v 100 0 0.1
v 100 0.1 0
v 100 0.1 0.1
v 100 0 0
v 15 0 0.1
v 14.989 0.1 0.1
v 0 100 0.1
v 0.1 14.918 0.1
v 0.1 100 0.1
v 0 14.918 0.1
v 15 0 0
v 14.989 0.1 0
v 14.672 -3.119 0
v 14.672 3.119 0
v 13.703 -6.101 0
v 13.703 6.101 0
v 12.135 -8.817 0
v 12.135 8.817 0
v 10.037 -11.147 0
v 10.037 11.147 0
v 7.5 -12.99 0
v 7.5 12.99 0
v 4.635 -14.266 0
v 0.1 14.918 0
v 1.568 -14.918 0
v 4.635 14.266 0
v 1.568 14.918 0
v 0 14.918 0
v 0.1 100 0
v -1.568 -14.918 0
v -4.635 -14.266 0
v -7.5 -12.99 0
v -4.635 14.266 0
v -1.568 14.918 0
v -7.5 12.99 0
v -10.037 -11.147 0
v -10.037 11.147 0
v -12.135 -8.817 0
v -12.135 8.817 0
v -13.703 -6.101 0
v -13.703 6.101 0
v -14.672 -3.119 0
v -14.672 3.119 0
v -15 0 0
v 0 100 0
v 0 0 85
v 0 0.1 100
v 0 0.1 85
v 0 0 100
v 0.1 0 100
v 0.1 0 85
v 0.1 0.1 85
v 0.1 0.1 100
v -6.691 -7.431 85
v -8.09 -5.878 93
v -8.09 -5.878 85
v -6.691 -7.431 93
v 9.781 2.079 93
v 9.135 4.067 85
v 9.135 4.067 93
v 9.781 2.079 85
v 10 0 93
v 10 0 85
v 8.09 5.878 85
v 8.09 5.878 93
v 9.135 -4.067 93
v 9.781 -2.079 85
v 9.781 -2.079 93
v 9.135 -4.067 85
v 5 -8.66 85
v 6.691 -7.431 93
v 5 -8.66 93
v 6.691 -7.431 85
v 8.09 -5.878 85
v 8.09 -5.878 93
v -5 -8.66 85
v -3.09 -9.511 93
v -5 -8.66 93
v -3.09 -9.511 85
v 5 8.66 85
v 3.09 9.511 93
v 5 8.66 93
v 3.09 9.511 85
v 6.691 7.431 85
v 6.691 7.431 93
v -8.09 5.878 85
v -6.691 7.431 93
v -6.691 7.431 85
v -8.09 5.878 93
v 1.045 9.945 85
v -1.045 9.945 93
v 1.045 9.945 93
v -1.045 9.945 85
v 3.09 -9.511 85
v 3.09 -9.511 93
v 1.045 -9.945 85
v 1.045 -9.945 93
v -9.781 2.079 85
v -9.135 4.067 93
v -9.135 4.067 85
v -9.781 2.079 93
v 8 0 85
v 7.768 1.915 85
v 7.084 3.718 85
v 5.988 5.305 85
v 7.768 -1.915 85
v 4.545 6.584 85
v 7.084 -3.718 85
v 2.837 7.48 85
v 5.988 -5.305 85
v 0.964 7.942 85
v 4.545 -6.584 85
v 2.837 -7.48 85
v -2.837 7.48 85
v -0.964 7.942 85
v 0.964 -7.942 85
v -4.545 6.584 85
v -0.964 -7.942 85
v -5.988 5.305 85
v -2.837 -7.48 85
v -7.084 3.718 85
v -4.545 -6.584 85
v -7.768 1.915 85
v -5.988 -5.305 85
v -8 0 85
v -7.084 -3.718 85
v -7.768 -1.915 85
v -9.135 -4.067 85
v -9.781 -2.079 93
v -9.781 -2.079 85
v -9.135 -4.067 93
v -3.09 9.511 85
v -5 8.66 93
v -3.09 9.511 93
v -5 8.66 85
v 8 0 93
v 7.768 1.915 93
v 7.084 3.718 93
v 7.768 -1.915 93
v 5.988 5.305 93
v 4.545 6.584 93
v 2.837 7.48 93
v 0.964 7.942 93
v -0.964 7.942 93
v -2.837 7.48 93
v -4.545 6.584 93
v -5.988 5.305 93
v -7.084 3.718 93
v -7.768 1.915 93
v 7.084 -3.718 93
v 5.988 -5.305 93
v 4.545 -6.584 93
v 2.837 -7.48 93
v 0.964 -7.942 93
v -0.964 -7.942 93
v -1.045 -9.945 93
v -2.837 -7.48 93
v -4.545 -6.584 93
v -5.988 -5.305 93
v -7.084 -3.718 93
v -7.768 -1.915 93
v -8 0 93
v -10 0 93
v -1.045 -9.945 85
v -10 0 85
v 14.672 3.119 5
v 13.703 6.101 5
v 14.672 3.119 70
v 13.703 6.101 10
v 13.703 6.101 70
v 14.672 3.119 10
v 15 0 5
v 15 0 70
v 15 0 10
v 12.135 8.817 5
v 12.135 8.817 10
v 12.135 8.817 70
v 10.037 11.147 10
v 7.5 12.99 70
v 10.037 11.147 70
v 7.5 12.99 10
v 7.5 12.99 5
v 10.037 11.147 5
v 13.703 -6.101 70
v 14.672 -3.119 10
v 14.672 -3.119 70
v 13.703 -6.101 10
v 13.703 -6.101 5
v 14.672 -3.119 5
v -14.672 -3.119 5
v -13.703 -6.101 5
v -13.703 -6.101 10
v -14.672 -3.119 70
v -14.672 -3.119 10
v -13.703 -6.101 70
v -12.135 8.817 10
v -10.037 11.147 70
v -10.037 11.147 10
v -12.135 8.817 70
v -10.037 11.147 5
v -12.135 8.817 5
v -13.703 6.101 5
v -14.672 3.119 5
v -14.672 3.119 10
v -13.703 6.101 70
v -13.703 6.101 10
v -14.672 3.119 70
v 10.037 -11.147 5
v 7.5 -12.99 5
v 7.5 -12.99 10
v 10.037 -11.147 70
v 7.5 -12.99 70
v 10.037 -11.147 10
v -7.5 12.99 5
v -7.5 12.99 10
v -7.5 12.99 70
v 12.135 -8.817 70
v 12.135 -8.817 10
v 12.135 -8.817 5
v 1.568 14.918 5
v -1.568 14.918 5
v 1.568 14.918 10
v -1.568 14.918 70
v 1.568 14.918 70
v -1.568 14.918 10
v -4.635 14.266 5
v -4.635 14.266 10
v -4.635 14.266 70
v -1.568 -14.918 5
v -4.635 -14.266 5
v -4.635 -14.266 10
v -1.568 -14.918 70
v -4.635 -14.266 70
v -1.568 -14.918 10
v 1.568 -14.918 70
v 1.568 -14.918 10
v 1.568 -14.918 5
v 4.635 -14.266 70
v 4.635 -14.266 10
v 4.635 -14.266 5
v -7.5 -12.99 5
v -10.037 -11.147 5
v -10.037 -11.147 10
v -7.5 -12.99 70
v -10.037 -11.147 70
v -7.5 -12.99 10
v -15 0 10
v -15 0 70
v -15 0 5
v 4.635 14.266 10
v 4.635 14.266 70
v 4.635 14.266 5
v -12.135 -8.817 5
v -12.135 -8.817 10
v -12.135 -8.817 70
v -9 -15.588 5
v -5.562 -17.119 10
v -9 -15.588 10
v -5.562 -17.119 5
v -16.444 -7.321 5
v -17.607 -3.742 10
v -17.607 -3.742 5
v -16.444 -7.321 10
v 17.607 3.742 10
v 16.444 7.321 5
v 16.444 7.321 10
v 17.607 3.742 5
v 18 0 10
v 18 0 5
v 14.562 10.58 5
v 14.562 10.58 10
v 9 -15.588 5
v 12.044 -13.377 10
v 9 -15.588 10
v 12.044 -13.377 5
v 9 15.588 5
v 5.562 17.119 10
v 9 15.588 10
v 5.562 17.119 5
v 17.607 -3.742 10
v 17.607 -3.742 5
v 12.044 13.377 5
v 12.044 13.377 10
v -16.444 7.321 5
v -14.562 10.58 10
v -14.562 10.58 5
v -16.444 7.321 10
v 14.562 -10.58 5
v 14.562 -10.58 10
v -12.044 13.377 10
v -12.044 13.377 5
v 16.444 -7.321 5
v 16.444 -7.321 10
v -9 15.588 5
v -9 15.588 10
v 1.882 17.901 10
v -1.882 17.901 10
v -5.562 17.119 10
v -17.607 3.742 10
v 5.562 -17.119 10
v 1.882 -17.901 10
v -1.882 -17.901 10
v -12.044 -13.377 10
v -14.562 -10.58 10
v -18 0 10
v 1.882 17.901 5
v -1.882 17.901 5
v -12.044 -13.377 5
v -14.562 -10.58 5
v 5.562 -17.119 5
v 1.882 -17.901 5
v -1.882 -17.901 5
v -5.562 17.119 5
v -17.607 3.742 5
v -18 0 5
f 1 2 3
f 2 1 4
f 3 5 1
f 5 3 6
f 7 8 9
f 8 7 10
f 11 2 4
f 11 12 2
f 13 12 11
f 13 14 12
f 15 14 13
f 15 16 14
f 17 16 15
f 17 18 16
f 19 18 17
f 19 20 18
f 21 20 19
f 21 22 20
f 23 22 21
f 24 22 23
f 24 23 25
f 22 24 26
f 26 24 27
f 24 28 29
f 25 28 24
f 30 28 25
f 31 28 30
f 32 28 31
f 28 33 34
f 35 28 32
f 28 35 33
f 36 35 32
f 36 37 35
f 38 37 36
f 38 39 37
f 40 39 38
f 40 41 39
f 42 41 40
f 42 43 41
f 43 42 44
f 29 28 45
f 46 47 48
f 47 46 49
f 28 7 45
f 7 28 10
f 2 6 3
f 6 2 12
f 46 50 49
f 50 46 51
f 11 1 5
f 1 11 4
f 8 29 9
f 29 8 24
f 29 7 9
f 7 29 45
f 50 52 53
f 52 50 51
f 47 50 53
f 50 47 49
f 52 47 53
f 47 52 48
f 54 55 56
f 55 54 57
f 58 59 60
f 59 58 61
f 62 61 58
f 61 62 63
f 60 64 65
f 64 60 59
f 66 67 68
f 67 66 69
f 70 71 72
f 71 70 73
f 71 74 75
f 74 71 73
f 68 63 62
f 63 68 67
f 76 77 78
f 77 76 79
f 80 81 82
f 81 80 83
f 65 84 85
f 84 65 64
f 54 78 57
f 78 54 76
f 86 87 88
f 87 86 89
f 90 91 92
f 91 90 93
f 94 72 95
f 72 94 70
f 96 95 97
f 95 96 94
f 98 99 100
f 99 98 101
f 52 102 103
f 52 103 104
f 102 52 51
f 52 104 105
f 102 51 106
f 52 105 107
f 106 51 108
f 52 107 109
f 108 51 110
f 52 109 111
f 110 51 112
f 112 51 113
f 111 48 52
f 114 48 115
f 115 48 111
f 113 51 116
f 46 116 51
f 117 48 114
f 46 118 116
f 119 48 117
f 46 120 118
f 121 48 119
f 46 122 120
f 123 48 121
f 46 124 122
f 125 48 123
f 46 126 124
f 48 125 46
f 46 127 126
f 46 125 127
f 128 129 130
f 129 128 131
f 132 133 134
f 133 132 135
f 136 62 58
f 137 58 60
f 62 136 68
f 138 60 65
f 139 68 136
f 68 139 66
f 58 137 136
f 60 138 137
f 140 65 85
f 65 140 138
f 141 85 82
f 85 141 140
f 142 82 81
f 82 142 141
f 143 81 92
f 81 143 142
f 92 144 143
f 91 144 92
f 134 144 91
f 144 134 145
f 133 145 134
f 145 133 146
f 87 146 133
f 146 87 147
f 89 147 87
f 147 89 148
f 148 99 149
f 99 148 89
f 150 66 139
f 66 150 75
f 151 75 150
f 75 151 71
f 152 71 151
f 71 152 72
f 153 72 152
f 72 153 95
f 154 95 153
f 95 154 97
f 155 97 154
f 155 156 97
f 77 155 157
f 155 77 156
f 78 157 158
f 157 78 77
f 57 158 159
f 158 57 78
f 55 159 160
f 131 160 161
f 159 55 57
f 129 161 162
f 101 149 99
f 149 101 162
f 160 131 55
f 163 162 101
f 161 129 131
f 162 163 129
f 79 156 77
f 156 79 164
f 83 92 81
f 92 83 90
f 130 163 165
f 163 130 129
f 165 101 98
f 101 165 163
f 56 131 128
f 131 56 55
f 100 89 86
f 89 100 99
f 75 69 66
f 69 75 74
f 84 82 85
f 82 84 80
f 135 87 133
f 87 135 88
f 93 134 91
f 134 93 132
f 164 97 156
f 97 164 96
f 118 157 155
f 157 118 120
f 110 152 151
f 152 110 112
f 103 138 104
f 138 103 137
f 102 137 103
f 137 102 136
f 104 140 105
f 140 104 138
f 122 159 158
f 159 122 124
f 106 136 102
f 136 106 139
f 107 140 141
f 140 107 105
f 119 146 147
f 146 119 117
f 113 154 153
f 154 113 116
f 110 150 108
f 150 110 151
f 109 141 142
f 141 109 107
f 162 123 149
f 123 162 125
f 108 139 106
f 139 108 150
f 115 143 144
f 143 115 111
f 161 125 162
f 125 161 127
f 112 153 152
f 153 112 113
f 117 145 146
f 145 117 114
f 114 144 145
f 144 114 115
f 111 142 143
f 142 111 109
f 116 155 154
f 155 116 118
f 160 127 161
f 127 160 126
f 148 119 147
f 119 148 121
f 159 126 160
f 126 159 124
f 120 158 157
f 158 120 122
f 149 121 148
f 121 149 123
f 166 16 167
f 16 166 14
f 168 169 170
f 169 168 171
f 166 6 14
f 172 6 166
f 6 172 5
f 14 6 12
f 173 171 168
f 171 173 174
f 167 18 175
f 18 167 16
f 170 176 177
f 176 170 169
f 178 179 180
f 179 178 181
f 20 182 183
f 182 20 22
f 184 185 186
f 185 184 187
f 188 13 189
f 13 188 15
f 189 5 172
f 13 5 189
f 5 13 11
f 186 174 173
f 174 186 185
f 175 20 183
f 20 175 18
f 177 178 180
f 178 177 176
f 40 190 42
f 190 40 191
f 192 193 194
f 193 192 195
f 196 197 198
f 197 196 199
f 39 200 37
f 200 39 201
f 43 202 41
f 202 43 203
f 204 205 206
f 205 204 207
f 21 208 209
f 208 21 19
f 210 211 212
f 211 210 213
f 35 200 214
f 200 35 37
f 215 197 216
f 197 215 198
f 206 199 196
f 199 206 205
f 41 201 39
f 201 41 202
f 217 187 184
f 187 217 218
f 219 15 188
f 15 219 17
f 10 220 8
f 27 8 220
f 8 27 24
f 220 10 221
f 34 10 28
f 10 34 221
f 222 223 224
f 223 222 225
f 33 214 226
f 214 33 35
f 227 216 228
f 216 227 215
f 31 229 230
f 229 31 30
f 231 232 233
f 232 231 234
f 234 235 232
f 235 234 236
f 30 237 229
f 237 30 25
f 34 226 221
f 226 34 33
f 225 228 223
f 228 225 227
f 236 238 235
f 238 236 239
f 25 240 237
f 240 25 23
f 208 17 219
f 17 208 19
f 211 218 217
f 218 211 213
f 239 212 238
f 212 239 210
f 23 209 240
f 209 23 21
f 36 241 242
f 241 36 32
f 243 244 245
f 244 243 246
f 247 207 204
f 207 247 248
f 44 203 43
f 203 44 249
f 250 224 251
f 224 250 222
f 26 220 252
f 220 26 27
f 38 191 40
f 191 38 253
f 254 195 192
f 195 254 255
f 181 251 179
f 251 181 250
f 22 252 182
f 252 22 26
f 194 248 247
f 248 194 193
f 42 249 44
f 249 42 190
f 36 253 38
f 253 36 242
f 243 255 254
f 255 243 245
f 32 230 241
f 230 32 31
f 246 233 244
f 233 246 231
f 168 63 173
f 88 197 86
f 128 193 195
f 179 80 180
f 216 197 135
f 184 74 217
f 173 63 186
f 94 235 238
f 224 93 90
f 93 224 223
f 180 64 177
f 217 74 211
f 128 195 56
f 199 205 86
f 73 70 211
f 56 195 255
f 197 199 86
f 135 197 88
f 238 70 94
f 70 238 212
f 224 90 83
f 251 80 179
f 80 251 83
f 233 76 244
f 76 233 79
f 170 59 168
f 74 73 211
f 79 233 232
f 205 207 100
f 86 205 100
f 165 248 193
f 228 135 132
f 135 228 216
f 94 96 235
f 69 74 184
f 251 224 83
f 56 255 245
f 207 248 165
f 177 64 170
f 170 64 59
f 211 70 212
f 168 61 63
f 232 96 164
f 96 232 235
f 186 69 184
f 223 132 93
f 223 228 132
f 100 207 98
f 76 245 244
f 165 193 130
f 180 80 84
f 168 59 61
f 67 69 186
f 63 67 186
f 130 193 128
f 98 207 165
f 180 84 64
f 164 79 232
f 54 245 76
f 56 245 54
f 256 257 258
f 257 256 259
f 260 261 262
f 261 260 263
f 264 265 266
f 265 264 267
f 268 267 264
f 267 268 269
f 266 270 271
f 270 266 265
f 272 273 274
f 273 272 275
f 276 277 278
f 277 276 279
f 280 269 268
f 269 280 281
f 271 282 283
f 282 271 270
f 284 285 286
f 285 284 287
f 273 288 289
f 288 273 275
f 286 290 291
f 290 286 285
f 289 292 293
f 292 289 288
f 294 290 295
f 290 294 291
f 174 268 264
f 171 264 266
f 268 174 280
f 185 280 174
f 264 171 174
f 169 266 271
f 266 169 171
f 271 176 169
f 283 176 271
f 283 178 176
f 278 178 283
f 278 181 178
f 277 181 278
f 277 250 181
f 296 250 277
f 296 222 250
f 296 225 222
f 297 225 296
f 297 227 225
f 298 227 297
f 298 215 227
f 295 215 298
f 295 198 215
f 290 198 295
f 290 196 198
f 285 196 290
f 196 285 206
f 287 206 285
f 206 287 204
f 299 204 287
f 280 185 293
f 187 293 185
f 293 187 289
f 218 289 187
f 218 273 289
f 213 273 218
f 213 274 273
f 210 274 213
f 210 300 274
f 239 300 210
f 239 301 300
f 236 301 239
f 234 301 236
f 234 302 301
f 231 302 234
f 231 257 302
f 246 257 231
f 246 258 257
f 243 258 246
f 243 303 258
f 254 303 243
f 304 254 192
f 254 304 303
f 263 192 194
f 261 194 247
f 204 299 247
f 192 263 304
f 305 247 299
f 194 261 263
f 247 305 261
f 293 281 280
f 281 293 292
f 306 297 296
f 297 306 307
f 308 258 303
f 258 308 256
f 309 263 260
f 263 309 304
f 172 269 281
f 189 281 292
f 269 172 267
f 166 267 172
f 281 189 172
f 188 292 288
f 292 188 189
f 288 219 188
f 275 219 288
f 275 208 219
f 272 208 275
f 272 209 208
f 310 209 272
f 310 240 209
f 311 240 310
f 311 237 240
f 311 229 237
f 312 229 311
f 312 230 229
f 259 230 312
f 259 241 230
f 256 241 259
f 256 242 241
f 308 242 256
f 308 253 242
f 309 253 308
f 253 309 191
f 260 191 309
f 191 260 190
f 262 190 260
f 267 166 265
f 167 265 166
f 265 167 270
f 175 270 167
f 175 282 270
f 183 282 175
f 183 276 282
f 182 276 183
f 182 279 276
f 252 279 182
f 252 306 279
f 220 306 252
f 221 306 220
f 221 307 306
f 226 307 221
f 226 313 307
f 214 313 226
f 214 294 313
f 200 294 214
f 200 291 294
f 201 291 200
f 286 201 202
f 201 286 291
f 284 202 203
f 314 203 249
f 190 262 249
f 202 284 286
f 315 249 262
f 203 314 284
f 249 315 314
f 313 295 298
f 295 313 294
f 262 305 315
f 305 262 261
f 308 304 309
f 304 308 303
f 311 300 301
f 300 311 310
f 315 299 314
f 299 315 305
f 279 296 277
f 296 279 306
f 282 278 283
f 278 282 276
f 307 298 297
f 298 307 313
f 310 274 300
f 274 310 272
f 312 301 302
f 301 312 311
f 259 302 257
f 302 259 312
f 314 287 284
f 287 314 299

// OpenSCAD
    // Combined Scene

    // Permanent Model
    
    // Permanent Model (Black)
    color([0, 0, 0]) {
        // Your permanent model code here
        cube([100,0.1,0.1], center = false);
        cube([0.1,100,0.1], center = false);
        cube([0.1,0.1,100], center = false);
    }
    

    // Dynamic Model
    cylinder(h = 70, r = 15); // Main body of the bottle

translate([0, 0, 70]) {
    // Neck of the bottle
    cylinder(h = 15, r1 = 15, r2 = 10);
}

translate([0, 0, 85]) {
    // Cap design
    difference() {
        cylinder(h = 8, r = 10); // Cap body
        translate([0, 0, -1])
            cylinder(h = 9, r = 8); // Indentation for cap
    }
}

translate([0, 0, 5]) {
    // Base design for stability
    cylinder(h = 5, r = 18);
}

// Adding subtle embossing for visual interest
translate([0, 0, 35]) {
    for (i = [0 : 11]) {
        rotate(i * 30) {
            translate([0, 12, 0]) {
                cylinder(h = 1, r = 1.5); // Embossed details
            }
        }
    }
}
    
